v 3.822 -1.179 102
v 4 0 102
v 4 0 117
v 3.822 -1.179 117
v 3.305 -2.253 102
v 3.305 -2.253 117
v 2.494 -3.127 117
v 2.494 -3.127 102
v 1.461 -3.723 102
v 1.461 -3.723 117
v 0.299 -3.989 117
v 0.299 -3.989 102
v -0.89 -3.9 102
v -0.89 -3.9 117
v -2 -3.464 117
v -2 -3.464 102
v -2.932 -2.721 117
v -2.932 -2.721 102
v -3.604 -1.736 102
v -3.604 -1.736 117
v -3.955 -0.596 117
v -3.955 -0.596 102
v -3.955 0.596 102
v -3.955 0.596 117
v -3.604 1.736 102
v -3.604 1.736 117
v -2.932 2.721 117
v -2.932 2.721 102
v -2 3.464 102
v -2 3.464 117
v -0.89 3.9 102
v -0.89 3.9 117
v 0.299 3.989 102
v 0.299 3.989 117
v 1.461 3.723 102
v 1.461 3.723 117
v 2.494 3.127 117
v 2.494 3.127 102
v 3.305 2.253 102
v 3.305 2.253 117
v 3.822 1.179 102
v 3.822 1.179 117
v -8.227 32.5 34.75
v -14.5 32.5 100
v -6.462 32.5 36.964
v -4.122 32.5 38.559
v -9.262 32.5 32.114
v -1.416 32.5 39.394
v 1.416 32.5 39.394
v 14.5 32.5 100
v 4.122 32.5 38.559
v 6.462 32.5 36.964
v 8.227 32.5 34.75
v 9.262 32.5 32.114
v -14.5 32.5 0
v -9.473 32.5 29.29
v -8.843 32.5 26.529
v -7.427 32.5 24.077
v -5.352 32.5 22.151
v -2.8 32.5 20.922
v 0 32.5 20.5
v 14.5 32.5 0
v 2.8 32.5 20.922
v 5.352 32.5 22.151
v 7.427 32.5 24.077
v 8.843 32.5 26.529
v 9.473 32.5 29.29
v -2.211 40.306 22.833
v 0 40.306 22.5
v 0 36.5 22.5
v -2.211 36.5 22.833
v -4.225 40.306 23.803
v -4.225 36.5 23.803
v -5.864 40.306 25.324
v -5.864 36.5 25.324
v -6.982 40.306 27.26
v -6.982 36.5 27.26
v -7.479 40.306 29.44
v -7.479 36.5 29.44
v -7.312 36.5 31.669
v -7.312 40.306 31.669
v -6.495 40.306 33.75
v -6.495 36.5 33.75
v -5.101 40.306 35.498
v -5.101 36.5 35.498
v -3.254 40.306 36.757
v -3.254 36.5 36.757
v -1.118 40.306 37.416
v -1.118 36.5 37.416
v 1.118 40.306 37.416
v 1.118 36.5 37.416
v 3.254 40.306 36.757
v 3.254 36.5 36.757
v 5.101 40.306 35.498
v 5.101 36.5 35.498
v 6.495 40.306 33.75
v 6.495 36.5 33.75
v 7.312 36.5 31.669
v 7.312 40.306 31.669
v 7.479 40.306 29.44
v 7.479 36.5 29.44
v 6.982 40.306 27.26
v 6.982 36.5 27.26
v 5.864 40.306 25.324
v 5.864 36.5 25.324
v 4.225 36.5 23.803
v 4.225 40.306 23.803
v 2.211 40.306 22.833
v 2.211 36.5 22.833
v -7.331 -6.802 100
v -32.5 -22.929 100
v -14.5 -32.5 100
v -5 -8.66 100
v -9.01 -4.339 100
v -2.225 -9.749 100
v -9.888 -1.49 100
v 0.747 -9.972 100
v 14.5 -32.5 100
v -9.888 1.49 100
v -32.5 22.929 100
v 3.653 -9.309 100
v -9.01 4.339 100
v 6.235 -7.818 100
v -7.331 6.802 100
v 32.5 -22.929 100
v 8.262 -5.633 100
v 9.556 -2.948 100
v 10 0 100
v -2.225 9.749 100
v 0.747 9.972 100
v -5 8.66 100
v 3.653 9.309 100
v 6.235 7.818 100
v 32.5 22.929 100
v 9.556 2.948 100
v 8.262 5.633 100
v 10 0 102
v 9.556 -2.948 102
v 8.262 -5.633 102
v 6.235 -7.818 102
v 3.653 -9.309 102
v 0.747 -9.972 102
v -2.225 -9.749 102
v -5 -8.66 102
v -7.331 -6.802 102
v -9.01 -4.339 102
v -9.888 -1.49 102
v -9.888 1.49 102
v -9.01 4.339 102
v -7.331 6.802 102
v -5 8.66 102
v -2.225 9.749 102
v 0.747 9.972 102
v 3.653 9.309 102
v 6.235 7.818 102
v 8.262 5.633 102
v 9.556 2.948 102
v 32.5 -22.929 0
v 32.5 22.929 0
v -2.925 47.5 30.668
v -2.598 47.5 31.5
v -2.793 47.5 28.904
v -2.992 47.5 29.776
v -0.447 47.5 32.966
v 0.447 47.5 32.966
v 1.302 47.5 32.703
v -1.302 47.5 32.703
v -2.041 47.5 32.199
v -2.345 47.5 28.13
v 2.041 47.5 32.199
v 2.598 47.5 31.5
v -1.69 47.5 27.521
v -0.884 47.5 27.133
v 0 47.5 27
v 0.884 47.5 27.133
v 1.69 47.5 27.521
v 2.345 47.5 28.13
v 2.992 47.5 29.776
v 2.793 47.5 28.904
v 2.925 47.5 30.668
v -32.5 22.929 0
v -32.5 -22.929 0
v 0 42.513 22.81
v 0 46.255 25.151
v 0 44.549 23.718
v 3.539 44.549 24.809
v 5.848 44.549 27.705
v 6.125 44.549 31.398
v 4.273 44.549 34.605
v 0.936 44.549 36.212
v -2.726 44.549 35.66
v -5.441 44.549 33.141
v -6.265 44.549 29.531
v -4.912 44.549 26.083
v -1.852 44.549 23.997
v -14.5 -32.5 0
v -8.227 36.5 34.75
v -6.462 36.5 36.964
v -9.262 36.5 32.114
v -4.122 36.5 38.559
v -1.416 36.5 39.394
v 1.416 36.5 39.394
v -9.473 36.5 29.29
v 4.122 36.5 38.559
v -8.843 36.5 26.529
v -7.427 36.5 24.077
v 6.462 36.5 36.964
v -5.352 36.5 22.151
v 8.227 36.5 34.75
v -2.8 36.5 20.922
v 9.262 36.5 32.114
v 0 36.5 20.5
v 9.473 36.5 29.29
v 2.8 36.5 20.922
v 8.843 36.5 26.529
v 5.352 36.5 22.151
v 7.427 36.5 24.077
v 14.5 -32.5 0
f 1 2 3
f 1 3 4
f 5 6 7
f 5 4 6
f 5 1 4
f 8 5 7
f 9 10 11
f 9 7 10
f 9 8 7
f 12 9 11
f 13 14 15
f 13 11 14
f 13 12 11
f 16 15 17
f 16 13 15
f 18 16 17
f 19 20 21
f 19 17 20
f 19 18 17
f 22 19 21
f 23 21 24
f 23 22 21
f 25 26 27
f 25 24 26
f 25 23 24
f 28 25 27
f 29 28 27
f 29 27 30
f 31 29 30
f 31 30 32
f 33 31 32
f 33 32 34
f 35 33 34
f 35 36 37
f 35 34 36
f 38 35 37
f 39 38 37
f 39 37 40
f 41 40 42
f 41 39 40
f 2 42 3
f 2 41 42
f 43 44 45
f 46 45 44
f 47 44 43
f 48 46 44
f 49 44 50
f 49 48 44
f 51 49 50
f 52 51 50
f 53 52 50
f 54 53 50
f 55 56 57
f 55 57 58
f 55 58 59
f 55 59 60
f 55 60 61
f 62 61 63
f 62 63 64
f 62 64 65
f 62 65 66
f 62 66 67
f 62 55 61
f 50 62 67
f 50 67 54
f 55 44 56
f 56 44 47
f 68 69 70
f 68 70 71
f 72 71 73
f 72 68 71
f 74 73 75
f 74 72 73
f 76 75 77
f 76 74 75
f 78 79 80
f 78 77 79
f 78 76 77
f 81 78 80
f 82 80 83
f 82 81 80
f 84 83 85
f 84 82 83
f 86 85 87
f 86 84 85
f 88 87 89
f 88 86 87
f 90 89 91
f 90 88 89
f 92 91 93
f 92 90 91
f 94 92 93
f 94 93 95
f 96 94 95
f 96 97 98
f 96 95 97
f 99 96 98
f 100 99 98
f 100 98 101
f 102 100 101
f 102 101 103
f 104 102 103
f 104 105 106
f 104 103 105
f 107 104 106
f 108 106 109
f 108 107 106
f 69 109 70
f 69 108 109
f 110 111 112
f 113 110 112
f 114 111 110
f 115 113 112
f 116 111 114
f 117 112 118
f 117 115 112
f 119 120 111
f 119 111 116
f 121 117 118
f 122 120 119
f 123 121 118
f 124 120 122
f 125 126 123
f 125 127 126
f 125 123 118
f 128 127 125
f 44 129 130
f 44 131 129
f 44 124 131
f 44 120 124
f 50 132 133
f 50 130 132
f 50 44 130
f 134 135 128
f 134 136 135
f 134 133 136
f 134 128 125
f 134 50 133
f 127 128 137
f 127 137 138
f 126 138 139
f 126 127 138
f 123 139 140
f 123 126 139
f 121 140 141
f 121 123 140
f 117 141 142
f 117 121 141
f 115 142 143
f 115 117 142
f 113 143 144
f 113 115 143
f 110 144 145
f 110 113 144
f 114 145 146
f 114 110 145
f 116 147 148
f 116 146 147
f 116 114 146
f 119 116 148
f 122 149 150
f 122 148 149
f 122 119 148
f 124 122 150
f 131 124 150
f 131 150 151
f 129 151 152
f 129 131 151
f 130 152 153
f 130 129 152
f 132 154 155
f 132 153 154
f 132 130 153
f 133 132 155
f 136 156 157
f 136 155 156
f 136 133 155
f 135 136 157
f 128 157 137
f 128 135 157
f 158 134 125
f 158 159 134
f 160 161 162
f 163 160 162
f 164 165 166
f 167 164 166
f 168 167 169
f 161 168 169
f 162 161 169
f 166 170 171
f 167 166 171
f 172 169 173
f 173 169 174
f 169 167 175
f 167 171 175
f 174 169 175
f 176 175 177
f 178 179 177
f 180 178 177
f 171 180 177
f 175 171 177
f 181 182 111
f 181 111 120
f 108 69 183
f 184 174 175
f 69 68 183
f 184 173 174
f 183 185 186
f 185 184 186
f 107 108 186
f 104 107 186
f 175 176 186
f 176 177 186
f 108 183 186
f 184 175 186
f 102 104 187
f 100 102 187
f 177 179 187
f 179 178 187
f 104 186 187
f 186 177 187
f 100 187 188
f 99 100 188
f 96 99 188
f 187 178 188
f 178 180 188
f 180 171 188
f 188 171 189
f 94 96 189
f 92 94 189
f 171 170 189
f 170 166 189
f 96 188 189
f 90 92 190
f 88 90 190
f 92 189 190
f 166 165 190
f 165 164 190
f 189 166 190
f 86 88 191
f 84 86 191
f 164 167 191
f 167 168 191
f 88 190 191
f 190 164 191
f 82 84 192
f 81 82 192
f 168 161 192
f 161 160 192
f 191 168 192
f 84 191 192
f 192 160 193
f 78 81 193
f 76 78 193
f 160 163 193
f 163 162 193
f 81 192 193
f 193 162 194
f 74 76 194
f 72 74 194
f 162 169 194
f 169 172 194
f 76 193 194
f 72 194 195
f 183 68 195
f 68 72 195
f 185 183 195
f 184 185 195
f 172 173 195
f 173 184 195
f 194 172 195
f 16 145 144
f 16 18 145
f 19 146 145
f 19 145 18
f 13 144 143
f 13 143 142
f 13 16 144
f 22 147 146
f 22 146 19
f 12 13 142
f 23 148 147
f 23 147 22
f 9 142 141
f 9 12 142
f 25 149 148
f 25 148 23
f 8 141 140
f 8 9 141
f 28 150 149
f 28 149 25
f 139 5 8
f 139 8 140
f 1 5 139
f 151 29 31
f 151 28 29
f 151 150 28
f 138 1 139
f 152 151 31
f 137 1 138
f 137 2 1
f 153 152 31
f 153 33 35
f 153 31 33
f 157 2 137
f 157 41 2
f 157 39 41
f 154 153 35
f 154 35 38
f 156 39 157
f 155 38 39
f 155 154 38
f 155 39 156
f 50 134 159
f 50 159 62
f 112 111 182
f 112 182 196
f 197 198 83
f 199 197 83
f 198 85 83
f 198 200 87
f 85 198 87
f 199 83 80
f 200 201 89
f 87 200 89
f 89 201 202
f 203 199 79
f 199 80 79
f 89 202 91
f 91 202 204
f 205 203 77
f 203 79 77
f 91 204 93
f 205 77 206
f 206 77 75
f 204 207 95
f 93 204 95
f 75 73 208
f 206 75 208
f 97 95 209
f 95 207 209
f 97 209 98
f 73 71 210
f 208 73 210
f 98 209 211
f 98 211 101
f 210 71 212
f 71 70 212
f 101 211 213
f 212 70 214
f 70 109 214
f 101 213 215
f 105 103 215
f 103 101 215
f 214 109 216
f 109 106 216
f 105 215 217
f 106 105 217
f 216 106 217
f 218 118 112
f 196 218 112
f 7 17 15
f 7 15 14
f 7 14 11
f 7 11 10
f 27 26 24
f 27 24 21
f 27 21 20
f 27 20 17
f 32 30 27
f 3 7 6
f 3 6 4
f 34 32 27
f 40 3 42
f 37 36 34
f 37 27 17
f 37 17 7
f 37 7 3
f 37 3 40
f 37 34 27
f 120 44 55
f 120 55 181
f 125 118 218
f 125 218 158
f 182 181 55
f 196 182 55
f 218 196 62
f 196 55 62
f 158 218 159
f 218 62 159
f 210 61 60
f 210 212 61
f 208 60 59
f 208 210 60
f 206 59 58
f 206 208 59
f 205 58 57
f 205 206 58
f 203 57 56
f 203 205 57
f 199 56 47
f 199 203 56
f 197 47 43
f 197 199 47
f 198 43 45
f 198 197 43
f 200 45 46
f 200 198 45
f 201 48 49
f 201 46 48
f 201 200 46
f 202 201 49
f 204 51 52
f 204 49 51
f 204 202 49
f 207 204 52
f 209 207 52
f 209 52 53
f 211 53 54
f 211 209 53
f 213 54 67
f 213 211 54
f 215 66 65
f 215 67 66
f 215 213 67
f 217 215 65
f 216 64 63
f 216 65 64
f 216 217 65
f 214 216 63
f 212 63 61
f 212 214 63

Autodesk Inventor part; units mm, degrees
ref_plane "YZ Plane" through (0, 0, 0) normal (1, 0, 0) x (0, 1, 0)
ref_plane "XZ Plane" through (0, 0, 0) normal (0, 1, 0) x (-1, 0, 0)
ref_plane "XY Plane" through (0, 0, 0) normal (0, 0, 1) x (1, 0, 0)
sketch "Skizze1" plane through (0, 0, 0) normal (0, 0, 1) x (1, 0, 0)
  line L0 (-32.5, 32.5) -> (32.5, 32.5)
  line L1 (32.5, 32.5) -> (32.5, -32.5)
  line L2 (32.5, -32.5) -> (-32.5, -32.5)
  line L3 (-32.5, -32.5) -> (-32.5, 32.5)
  point P0 (0, 0)
  point P1 (-32.5, 16.5982)
  point P2 (-16.4712, 32.5)
  dimension "d0" = 65
  dimension "d1" = 65
  dimension "d2" = 32.5
  dimension "d3" = 32.5
extrude "Extrusion1" add sketch "Skizze1" along normal blind 100
sketch "Skizze2" plane through (0, 0, 100) normal (0, 0, 1) x (1, 0, 0)
  circle A0 centre (0, 0) radius 10
  dimension "d6" = 20
extrude "Extrusion2" add sketch "Skizze2" along normal blind 2
sketch "Skizze3" plane through (0, 0, 102) normal (0, 0, 1) x (1, 0, 0)
  circle A0 centre (0, 0) radius 4
  dimension "d9" = 8
extrude "Extrusion3" add sketch "Skizze3" along normal blind 15
sketch "Sketch4" plane through (0, 0, 100) normal (0, 0, 1) x (1, 0, 0)
  line L0 (32.5, 32.5) -> (-32.5, 32.5) projected
  line L1 (-14.5, 32.5) -> (-32.5, 22.9292)
  line L2 (-32.5, 32.5) -> (-32.5, -32.5) projected
  line L3 (-32.5, 32.5) -> (-14.5, 32.5)
  line L4 (-32.5, 32.5) -> (-32.5, 22.9292)
  point P0 (0, 0)
  dimension "d15" = 28
  dimension "d16" = 18
extrude "Extrusion4" cut sketch "Sketch4" against normal up to surface (100 mm away)
mirror "Mirror1" about plane through (0, 0, 0) normal (1, 0, 0) of "Extrusion4"
mirror "Mirror2" about plane through (0, 0, 0) normal (0, 1, 0) of "Extrusion4", "Mirror1"
sketch "Sketch5" plane through (0, 0, 0) normal (1, 0, 0) x (0, 1, 0)
  line L0 (32.5, 0) -> (32.5, 100) projected
  line L1 (32.5, 20.5) -> (36.5, 20.5)
  line L2 (36.5, 20.5) -> (36.5, 22.5)
  line L3 (36.5, 22.5) -> (40.3063, 22.5)
  line L4 (47.5, 30) -> (32.5, 30)
  line L5 (32.5, 20.5) -> (32.5, 30)
  line L6 (22.9292, 0) -> (32.5, 0) projected
  arc A0 (40.3063, 22.5) -> (47.5, 27) centre (40.3063, 30.5) ccw
  line L7 (47.5, 27) -> (47.5, 30)
  point P0 (0, 0)
  dimension "d19" = 4
  dimension "d20" = 2
  dimension "d21" = 15
  dimension "d22" = 30
  dimension "d23" = 15
  dimension "d24" = 8
  dimension "d25" = 3
revolve "Revolution1" add sketch "Sketch5" angle 360 about axis through (0, 47.5, 30) along (0, -1, 0)
equation "\"d1\" = d0"
equation "\"d2\" = 0.5 * d0"
equation "\"d3\" = 0.5 * d1"
properties part number "motor" material "Stahl"
